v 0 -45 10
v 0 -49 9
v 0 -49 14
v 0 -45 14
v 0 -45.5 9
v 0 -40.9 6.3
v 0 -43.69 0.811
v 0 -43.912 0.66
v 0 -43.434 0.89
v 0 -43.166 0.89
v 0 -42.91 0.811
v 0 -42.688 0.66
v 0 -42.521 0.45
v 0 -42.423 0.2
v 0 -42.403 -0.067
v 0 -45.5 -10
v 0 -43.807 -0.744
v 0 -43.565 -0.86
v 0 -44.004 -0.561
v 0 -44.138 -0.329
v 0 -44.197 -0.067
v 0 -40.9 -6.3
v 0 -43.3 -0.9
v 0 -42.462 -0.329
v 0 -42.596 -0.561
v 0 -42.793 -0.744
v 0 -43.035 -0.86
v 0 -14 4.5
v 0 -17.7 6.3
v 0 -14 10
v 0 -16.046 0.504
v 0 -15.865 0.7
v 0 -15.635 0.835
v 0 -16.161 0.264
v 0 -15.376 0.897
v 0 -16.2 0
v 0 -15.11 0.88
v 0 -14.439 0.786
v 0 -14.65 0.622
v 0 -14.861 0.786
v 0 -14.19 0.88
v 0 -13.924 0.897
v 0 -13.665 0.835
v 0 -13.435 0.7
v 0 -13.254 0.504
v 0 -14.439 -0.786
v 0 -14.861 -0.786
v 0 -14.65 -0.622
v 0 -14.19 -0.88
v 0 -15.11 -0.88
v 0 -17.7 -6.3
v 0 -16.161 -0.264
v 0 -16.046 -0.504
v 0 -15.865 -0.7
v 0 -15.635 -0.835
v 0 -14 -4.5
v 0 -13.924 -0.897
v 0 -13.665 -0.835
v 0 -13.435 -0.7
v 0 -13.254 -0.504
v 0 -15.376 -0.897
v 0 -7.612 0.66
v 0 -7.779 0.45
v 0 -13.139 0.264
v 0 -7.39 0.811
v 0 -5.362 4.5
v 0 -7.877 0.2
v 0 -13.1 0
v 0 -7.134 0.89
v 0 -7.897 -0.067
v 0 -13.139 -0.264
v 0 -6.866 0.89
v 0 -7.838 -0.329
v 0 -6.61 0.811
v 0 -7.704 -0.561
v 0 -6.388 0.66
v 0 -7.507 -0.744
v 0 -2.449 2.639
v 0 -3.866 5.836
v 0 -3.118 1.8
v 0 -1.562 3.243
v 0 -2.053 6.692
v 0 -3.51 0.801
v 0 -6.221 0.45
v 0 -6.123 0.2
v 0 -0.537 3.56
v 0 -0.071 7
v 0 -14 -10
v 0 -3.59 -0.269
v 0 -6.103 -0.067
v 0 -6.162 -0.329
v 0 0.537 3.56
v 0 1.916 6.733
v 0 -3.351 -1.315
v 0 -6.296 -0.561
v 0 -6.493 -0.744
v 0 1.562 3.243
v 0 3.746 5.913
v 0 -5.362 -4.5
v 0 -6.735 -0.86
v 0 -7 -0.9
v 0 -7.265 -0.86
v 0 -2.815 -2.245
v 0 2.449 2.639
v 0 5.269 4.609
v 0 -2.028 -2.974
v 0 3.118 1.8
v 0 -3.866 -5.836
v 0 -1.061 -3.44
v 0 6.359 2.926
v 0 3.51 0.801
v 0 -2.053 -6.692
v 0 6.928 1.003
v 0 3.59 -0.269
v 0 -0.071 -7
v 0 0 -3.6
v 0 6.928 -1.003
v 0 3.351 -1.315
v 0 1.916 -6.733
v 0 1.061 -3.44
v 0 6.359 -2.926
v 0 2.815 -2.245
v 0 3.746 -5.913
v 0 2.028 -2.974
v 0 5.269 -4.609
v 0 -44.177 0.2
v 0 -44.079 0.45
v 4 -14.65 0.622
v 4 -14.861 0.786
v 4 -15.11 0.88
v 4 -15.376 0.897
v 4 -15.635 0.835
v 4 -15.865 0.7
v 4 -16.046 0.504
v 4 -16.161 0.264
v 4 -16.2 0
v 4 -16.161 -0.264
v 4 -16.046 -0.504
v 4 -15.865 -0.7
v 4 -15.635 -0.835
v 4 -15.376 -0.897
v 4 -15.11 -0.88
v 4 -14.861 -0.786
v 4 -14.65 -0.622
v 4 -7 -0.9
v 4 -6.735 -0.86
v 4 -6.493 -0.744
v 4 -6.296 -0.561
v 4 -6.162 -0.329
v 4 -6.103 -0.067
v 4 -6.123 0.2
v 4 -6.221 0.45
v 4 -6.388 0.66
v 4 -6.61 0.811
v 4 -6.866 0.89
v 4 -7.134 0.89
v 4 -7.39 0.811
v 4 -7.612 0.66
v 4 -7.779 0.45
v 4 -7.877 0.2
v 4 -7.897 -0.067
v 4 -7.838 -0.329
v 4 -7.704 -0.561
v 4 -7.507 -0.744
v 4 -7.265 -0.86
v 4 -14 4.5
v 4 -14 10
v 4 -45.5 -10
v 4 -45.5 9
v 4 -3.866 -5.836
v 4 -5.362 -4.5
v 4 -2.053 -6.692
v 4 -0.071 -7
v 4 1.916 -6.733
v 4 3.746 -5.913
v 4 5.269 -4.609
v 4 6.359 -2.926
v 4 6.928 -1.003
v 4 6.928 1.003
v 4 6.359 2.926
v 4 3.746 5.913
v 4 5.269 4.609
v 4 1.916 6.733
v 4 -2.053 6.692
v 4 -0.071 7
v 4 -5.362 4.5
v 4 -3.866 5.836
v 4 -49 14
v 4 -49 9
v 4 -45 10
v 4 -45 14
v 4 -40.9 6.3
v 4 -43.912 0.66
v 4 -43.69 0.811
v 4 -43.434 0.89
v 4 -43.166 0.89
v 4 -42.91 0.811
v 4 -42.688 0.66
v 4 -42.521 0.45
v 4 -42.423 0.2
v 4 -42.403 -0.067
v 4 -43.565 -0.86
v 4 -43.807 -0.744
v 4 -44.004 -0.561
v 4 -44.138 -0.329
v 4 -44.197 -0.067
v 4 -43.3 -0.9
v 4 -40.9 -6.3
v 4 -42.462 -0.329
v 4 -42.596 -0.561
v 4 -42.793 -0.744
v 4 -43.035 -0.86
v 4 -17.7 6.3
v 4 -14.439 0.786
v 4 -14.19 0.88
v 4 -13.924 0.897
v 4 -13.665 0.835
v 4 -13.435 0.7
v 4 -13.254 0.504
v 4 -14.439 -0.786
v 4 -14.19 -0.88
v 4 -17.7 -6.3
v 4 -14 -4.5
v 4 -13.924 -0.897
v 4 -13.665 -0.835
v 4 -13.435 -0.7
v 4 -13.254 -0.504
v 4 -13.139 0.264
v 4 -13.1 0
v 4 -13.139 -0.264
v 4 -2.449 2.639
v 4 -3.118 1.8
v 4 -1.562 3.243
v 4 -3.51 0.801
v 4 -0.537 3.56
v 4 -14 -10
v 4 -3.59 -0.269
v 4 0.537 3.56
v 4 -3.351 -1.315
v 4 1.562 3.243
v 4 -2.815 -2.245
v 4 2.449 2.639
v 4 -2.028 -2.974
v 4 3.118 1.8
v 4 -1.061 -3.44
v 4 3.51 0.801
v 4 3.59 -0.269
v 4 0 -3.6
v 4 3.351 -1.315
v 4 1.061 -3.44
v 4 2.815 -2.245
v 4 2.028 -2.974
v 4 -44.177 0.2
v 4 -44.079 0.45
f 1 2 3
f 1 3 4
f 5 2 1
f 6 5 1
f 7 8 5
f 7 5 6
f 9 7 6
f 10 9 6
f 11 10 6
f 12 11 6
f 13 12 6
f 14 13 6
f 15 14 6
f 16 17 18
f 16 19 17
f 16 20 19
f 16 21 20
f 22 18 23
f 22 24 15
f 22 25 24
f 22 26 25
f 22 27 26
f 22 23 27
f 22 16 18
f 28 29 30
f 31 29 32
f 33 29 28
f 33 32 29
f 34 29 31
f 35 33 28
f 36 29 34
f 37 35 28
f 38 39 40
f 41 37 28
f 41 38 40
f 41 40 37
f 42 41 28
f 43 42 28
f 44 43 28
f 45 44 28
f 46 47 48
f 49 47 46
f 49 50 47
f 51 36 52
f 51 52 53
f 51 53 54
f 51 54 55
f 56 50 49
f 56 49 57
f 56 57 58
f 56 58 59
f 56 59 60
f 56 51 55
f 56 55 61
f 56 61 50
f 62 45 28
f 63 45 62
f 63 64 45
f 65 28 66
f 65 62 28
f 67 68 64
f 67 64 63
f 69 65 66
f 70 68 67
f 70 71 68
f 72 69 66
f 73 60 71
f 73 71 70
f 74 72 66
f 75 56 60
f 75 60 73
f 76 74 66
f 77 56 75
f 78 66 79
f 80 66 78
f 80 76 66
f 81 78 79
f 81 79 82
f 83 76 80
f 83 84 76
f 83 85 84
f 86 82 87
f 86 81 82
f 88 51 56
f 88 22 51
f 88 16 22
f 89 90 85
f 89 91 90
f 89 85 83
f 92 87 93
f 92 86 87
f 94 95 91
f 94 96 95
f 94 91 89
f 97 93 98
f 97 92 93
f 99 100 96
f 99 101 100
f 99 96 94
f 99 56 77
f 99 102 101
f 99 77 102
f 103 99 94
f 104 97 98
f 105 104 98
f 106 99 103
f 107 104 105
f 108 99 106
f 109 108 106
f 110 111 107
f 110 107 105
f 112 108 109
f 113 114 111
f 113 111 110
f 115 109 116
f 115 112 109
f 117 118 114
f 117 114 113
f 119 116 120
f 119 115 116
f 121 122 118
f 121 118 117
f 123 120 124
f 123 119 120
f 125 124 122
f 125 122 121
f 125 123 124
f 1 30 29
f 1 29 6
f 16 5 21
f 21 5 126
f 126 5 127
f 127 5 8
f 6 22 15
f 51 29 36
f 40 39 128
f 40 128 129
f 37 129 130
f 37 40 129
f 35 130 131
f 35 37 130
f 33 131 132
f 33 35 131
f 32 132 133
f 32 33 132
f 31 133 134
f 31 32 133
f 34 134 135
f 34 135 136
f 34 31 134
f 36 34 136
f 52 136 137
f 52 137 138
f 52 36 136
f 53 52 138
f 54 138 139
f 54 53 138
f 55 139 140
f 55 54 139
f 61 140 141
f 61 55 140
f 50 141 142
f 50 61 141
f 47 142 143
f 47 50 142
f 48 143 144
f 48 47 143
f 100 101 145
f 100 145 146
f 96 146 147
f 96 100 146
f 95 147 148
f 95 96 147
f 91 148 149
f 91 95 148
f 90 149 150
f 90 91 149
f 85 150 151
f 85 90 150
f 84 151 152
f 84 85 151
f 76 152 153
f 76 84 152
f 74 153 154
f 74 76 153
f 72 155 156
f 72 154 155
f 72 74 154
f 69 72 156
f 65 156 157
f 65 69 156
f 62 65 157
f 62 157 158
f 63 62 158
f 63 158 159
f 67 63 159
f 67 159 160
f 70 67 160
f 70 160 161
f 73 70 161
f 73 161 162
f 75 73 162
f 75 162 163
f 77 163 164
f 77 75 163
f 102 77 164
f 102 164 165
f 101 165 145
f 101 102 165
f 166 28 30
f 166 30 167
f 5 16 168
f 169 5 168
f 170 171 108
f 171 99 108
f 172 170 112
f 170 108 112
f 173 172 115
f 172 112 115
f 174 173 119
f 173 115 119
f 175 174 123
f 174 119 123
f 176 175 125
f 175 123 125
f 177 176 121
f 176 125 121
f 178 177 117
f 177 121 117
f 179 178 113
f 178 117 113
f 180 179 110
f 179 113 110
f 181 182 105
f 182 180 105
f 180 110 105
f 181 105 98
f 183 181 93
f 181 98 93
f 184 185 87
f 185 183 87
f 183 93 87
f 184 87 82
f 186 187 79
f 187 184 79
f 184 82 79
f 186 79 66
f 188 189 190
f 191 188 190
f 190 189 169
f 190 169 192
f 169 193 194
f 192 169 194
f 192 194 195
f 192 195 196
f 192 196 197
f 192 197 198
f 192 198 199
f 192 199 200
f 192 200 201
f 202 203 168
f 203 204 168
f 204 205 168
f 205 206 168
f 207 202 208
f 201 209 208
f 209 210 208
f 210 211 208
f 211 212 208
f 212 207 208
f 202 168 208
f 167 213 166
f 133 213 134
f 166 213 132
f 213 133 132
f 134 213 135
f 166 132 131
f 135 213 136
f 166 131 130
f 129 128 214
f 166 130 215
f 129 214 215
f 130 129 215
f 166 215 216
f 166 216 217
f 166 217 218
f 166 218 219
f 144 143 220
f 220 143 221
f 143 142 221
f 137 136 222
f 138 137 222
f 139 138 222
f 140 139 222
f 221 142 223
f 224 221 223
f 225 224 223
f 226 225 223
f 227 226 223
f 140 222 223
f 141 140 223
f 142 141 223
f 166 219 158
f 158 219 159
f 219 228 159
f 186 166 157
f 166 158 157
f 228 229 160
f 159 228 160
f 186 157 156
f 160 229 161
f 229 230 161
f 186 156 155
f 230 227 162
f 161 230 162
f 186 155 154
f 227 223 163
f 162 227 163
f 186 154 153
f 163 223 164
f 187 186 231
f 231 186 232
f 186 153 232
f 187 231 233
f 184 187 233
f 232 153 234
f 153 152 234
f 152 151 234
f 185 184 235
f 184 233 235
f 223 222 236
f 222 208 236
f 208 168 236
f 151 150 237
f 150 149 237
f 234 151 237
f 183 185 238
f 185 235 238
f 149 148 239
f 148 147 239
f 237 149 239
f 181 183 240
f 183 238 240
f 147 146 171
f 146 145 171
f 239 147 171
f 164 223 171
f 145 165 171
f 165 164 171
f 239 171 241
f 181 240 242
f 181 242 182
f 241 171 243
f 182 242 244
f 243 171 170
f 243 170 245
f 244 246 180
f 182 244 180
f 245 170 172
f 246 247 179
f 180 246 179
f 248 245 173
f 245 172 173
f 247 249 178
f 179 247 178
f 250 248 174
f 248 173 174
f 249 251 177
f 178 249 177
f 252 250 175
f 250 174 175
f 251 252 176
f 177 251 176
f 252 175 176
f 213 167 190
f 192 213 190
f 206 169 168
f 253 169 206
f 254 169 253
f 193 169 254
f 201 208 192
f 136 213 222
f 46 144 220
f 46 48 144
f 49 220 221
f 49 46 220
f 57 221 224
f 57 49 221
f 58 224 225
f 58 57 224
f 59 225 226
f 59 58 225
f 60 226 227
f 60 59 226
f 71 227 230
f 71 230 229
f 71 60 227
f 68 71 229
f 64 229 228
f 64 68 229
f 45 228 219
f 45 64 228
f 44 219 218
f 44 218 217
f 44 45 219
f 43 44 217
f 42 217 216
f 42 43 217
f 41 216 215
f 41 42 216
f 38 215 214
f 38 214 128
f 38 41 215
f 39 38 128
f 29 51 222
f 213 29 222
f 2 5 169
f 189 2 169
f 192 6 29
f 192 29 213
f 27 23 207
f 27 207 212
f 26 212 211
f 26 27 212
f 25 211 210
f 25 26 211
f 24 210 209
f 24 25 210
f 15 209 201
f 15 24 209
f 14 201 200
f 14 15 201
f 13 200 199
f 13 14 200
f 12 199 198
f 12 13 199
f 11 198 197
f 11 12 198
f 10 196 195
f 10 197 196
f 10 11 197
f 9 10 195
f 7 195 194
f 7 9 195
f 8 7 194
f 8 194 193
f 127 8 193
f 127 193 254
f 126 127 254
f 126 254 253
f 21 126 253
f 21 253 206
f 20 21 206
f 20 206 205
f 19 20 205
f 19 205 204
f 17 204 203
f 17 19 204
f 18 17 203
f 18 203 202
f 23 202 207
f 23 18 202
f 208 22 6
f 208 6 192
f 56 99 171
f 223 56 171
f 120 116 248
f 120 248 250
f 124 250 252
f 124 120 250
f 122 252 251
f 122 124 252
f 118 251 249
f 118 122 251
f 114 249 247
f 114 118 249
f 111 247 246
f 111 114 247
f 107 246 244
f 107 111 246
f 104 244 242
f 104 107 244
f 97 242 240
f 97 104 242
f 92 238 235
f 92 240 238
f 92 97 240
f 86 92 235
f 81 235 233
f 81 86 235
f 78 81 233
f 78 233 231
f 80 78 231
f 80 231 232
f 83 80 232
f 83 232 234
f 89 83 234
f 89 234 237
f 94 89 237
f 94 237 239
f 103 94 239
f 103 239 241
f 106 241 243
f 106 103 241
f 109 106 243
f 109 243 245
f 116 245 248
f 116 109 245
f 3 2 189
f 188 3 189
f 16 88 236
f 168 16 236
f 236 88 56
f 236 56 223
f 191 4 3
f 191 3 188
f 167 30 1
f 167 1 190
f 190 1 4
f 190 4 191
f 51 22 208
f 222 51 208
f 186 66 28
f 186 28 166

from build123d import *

# Parameters (mm, degrees)
SKETCH1_R            = 7
BOSS_EXTRUDE1_DEPTH  = 4
BOSS_EXTRUDE2_START  = -4.5
SKETCH2_W            = 4
SKETCH2_H            = 34
BOSS_EXTRUDE2_DEPTH  = 9
BOSS_EXTRUDE3_START  = -10
SKETCH3_W            = 4
SKETCH3_H            = 31.5
BOSS_EXTRUDE3_DEPTH  = 20
BOSS_EXTRUDE4_START  = 9
SKETCH4_W            = 4
SKETCH4_H            = 4
BOSS_EXTRUDE4_DEPTH  = 5
BOSS_EXTRUDE5_START  = -1
SKETCH5_R            = 3.6
BOSS_EXTRUDE5_DEPTH  = 6
BOSS_EXTRUDE6_START  = -1
SKETCH6_R            = 0.9
BOSS_EXTRUDE6_DEPTH  = 6
BOSS_EXTRUDE7_START  = -1
SKETCH7_R            = 0.9
BOSS_EXTRUDE7_DEPTH  = 6
BOSS_EXTRUDE8_START  = -6.3
SKETCH8_W            = 6
SKETCH8_H            = 23.2
BOSS_EXTRUDE8_DEPTH  = 12.6
BOSS_EXTRUDE9_START  = -1
SKETCH9_R            = 0.9
BOSS_EXTRUDE9_DEPTH  = 6
BOSS_EXTRUDE10_START = -1
SKETCH10_R           = 0.9
BOSS_EXTRUDE10_DEPTH = 6


with BuildPart() as part:
    # Sketch1 → Boss-Extrude1 (new body)
    with BuildSketch(Plane(origin=(0, 0, 0), x_dir=(0, 0, -1), z_dir=(1, 0, 0))):
        Circle(SKETCH1_R)
    extrude(amount=BOSS_EXTRUDE1_DEPTH)

    # Sketch2 → Boss-Extrude2 (add)
    with BuildSketch(Plane.XY.offset(BOSS_EXTRUDE2_START)):
        with Locations((2, -17)):
            Rectangle(SKETCH2_W, SKETCH2_H)
    extrude(amount=BOSS_EXTRUDE2_DEPTH)

    # Sketch3 → Boss-Extrude3 (add)
    with BuildSketch(Plane.XY.offset(BOSS_EXTRUDE3_START)):
        with Locations((2, -29.75)):
            Rectangle(SKETCH3_W, SKETCH3_H)
    extrude(amount=BOSS_EXTRUDE3_DEPTH)

    # Sketch4 → Boss-Extrude4 (add)
    with BuildSketch(Plane.XY.offset(BOSS_EXTRUDE4_START)):
        with Locations((2, -47)):
            Rectangle(SKETCH4_W, SKETCH4_H)
    extrude(amount=BOSS_EXTRUDE4_DEPTH)


with BuildPart() as body_2:
    # Sketch5 → Boss-Extrude5 (new body)
    with BuildSketch(Plane(origin=(0, 0, 0), x_dir=(0, 0, -1), z_dir=(1, 0, 0)).offset(BOSS_EXTRUDE5_START)):
        Circle(SKETCH5_R)
    extrude(amount=BOSS_EXTRUDE5_DEPTH)


with BuildPart() as part_1:
    add(part.part)

    # Combine1: cut body 2
    add(body_2.part, mode=Mode.SUBTRACT)


with BuildPart() as body_2_2:
    # Sketch6 → Boss-Extrude6 (new body)
    with BuildSketch(Plane(origin=(0, 0, 0), x_dir=(0, 0, -1), z_dir=(1, 0, 0)).offset(BOSS_EXTRUDE6_START)):
        with Locations((0, -7)):
            Circle(SKETCH6_R)
    extrude(amount=BOSS_EXTRUDE6_DEPTH)


with BuildPart() as part_2:
    add(part_1.part)

    # Combine2: cut body 2 2
    add(body_2_2.part, mode=Mode.SUBTRACT)


with BuildPart() as body_2_3:
    # Sketch7 → Boss-Extrude7 (new body)
    with BuildSketch(Plane(origin=(0, 0, 0), x_dir=(0, 0, -1), z_dir=(1, 0, 0)).offset(BOSS_EXTRUDE7_START)):
        with Locations((0, -14)):
            Circle(SKETCH7_R)
    extrude(amount=BOSS_EXTRUDE7_DEPTH)


with BuildPart() as part_3:
    add(part_2.part)

    # Combine3: cut body 2 3
    add(body_2_3.part, mode=Mode.SUBTRACT)


with BuildPart() as body_2_4:
    # Sketch8 → Boss-Extrude8 (new body)
    with BuildSketch(Plane.XY.offset(BOSS_EXTRUDE8_START)):
        with Locations((2, -29.3)):
            Rectangle(SKETCH8_W, SKETCH8_H)
    extrude(amount=BOSS_EXTRUDE8_DEPTH)


with BuildPart() as part_4:
    add(part_3.part)

    # Combine4: cut body 2 4
    add(body_2_4.part, mode=Mode.SUBTRACT)


with BuildPart() as body_2_5:
    # Sketch9 → Boss-Extrude9 (new body)
    with BuildSketch(Plane(origin=(0, 0, 0), x_dir=(0, 0, -1), z_dir=(1, 0, 0)).offset(BOSS_EXTRUDE9_START)):
        with Locations((0, -43.3)):
            Circle(SKETCH9_R)
    extrude(amount=BOSS_EXTRUDE9_DEPTH)


with BuildPart() as part_5:
    add(part_4.part)

    # Combine5: cut body 2 5
    add(body_2_5.part, mode=Mode.SUBTRACT)


with BuildPart() as body_2_6:
    # Sketch10 → Boss-Extrude10 (new body)
    with BuildSketch(Plane(origin=(0, 0, 0), x_dir=(0, 0, -1), z_dir=(1, 0, 0)).offset(BOSS_EXTRUDE10_START)):
        with Locations((0, -15.3)):
            Circle(SKETCH10_R)
    extrude(amount=BOSS_EXTRUDE10_DEPTH)


with BuildPart() as part_6:
    add(part_5.part)

    # Combine6: cut body 2 6
    add(body_2_6.part, mode=Mode.SUBTRACT)


solid = part_6.part
